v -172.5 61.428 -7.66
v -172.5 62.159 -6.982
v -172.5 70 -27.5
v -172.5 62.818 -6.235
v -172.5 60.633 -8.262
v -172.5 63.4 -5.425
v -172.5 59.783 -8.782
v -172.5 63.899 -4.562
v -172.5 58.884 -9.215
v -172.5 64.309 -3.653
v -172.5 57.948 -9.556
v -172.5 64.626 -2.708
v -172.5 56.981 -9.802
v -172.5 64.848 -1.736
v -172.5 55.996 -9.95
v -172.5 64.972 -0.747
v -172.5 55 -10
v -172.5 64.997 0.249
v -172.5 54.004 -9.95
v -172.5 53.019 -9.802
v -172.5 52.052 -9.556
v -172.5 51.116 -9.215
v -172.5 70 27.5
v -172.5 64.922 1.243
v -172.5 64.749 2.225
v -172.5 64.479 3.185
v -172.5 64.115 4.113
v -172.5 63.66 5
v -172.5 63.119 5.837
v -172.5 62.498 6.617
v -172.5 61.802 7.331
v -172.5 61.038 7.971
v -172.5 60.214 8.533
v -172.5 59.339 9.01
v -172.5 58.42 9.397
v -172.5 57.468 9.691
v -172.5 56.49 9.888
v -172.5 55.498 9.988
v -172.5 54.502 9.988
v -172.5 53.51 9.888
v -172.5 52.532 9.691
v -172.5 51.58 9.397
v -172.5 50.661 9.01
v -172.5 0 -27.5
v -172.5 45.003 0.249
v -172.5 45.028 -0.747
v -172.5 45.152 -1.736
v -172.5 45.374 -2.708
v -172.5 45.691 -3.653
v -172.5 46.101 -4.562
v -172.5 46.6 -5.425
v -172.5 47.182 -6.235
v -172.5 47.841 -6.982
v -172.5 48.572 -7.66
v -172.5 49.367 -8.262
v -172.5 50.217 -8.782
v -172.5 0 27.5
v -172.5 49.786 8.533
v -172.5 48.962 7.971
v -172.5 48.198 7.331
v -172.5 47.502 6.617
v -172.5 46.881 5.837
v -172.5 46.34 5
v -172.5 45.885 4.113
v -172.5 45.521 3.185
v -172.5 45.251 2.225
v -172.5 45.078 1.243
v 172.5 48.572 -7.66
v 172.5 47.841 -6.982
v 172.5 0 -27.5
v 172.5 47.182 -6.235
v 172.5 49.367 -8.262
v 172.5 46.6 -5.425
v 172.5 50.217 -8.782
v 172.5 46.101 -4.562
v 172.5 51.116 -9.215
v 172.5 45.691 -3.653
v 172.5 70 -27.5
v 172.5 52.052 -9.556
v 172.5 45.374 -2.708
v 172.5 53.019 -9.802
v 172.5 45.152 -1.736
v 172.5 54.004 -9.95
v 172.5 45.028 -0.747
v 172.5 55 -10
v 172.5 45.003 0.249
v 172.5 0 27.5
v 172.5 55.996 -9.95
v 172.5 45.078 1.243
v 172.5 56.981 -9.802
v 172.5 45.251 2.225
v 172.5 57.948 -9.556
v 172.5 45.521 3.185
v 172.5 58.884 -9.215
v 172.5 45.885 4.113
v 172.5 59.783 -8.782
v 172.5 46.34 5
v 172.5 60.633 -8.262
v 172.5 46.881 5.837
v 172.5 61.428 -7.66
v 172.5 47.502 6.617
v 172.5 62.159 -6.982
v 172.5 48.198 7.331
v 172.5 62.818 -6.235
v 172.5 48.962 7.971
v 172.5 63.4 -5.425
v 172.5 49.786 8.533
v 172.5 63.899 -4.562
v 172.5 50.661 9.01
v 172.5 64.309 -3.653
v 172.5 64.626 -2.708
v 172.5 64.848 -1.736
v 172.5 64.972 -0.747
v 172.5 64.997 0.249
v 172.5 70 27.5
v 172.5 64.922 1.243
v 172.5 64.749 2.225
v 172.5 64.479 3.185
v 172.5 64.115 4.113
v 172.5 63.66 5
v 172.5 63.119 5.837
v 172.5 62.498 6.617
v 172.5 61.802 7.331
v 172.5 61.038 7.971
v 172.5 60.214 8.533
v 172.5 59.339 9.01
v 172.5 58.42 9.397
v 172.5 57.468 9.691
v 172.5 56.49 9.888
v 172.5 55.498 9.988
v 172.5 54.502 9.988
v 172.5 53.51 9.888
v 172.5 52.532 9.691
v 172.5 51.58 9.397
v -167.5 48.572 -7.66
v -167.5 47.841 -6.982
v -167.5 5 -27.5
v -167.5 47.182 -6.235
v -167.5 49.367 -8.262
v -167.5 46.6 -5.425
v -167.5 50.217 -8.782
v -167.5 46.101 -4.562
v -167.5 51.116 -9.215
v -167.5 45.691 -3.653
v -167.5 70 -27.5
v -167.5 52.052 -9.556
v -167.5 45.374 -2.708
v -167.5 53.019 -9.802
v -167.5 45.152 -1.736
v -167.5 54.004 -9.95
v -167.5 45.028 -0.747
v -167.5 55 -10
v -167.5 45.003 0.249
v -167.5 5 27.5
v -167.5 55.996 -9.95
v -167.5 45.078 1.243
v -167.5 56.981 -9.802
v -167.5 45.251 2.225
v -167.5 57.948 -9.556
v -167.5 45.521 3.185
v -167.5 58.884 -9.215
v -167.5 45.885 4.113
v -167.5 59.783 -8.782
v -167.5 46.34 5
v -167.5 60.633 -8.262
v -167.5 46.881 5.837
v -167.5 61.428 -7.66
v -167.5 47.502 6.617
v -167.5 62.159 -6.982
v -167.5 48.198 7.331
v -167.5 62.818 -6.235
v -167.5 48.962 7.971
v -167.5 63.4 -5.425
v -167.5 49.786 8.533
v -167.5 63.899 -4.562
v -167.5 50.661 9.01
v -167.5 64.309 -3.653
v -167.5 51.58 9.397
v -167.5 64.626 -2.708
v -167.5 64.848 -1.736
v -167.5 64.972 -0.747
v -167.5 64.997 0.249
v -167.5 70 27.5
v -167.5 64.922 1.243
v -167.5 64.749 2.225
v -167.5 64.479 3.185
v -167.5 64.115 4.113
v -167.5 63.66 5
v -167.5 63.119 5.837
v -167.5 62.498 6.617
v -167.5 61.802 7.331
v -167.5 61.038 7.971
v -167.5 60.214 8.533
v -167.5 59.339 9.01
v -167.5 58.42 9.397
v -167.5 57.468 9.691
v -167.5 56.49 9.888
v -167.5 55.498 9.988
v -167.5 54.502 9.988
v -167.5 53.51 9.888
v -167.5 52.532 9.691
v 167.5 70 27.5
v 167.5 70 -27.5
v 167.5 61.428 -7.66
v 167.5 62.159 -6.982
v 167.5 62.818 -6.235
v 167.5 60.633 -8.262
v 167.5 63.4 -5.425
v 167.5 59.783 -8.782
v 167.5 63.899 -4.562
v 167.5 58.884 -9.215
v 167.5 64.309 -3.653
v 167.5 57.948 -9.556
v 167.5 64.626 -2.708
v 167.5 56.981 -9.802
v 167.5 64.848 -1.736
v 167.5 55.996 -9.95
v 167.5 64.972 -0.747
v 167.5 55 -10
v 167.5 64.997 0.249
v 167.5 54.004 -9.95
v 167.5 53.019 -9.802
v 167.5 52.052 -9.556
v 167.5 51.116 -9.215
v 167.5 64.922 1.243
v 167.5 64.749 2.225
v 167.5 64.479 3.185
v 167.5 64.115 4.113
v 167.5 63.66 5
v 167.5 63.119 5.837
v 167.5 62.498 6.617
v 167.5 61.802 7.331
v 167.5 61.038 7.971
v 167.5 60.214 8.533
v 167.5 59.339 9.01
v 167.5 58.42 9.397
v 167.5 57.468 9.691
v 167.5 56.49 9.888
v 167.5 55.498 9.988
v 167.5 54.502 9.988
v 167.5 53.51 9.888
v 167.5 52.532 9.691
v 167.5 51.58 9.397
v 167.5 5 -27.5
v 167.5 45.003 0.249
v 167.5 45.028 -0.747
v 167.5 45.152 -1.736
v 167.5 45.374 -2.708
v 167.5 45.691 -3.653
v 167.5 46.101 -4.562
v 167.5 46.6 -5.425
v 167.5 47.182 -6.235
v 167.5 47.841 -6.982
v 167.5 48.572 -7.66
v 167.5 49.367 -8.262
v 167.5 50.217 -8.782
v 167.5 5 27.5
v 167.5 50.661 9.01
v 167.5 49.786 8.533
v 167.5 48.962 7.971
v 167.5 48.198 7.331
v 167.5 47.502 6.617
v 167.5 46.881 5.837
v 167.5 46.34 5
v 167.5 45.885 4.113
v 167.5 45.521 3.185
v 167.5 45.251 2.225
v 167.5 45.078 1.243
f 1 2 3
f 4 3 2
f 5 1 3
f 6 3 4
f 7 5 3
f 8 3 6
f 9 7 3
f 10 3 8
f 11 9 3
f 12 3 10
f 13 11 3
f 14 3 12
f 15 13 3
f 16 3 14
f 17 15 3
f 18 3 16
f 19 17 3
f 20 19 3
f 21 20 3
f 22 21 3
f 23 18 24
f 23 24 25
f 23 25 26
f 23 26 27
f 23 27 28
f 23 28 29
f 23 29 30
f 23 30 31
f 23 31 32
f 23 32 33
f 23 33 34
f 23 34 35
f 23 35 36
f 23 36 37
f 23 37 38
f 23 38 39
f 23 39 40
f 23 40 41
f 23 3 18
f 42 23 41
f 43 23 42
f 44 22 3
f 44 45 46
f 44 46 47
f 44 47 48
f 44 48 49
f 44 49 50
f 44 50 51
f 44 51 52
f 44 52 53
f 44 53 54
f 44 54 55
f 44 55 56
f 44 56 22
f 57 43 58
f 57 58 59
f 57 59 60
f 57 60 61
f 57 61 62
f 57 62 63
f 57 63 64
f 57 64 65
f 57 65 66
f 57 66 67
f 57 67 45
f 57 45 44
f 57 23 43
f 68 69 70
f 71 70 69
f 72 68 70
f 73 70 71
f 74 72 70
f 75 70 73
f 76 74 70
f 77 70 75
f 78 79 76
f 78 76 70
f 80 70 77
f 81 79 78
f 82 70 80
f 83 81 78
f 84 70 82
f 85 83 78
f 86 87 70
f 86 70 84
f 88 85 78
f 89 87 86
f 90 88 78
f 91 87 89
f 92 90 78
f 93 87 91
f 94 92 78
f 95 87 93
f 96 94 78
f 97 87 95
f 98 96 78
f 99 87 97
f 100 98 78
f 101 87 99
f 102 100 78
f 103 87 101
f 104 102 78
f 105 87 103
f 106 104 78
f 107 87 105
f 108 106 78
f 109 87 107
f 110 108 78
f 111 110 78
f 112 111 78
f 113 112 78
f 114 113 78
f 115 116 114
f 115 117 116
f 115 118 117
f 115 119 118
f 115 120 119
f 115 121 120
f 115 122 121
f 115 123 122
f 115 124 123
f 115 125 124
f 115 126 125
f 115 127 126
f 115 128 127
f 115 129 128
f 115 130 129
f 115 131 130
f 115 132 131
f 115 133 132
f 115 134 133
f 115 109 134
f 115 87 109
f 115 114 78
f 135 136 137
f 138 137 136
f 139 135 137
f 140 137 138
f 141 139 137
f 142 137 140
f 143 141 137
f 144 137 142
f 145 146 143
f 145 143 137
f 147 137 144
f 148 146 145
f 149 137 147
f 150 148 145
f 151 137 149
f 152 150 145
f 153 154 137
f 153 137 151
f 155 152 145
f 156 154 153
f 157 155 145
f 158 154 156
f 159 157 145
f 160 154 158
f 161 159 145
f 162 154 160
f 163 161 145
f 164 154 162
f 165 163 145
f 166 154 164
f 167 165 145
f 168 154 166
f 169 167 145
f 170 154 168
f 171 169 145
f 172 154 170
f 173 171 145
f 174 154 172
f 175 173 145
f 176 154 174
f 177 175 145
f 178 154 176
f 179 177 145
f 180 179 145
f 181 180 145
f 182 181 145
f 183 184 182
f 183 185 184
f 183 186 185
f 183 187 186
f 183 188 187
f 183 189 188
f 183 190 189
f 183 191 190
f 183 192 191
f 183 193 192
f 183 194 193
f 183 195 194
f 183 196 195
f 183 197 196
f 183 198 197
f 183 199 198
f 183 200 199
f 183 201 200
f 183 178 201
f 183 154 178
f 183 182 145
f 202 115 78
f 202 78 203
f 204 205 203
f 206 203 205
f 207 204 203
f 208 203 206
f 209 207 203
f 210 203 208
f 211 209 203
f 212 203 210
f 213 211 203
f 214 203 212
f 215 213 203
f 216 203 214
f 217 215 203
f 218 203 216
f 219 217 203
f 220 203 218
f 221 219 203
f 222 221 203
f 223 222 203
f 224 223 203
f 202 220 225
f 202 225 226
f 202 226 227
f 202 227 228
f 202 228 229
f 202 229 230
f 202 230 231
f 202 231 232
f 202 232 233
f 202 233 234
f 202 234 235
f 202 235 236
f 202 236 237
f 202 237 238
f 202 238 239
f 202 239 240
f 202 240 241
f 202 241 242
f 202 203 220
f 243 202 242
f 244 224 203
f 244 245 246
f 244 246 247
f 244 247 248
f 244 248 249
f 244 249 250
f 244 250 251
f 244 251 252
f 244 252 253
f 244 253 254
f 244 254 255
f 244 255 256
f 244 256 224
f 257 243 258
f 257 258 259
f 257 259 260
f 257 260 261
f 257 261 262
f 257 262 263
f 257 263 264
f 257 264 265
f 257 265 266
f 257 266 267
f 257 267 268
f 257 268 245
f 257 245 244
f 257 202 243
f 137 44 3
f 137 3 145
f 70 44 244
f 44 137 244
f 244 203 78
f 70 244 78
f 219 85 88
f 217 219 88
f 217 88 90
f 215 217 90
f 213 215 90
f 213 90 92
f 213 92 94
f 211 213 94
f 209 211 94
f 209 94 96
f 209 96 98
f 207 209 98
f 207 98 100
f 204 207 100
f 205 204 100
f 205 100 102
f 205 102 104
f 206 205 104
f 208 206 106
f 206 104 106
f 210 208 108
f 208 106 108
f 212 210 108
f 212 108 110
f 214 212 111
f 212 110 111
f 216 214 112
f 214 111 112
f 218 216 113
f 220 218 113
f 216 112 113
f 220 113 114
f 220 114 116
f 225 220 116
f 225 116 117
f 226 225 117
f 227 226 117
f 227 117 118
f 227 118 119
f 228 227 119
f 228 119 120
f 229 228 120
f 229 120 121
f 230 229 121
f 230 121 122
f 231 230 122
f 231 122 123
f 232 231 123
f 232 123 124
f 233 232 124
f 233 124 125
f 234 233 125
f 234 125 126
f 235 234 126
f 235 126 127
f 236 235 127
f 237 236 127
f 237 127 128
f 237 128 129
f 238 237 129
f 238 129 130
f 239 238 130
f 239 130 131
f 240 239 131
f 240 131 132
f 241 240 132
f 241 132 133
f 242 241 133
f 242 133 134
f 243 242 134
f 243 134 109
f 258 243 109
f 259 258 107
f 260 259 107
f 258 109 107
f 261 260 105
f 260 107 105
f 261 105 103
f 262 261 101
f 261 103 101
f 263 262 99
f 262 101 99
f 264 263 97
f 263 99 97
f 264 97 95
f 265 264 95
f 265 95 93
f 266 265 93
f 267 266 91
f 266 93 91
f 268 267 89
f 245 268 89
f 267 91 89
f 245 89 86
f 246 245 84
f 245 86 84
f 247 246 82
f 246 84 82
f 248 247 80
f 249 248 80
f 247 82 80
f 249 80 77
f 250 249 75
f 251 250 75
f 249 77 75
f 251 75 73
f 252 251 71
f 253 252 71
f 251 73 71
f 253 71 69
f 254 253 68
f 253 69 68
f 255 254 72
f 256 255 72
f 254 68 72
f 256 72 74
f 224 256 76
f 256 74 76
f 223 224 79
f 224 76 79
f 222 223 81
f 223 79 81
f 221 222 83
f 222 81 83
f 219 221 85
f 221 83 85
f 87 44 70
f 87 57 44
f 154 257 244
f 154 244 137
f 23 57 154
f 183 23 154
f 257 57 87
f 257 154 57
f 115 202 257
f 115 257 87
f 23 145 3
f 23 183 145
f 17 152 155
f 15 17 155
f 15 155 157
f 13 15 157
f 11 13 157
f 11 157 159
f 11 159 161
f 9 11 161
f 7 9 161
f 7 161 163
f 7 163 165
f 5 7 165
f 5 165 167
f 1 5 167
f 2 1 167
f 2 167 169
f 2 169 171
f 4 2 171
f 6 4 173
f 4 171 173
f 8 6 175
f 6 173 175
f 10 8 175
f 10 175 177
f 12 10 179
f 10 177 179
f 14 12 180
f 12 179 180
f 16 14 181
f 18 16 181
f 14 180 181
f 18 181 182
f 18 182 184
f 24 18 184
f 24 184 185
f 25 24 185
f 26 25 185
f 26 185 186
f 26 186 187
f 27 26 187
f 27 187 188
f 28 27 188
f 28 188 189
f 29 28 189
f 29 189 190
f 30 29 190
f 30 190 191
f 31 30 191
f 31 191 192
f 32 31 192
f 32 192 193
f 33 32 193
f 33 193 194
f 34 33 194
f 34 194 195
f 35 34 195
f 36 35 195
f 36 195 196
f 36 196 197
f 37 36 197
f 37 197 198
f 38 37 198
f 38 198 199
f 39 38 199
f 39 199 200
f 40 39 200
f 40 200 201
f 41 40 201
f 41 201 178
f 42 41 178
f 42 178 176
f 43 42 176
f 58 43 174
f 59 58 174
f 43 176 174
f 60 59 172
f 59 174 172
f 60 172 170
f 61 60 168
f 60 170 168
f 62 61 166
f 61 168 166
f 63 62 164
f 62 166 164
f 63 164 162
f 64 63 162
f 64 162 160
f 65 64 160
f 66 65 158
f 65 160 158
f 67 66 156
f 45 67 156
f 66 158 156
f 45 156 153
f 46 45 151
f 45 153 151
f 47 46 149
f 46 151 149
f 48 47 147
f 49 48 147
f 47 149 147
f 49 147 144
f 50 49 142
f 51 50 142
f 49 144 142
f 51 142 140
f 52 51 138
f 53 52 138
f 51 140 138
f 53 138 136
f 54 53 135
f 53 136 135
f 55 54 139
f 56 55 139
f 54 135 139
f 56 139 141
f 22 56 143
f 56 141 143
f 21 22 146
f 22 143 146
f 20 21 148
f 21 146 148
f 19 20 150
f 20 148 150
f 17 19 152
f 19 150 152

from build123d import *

# Parameters (mm, degrees)
BOSS_EXTRUDE1_DEPTH      = 27.5
BOSS_EXTRUDE1_DEPTH_BACK = 27.5
SKETCH2_R                = 10
CUT_EXTRUDE1_DEPTH       = 354.102322281


with BuildPart() as part:
    # Sketch1 → Boss-Extrude1 (new, two sides: drawn at the far end of the back side and taken through both)
    with BuildSketch(Plane.XY.offset(-BOSS_EXTRUDE1_DEPTH_BACK)):
        Polygon((-172.5, 0), (172.5, 0), (172.5, 70), (167.5, 70), (167.5, 5), (-167.5, 5), (-167.5, 70), (-172.5, 70), align=None)
    extrude(amount=BOSS_EXTRUDE1_DEPTH + BOSS_EXTRUDE1_DEPTH_BACK)

    # Sketch2 → Cut-Extrude1 (cut, through all)
    with BuildSketch(Plane(origin=(172.5, 0, 0), x_dir=(0, 0, -1), z_dir=(1, 0, 0))):
        with Locations((0, 55)):
            Circle(SKETCH2_R)
    extrude(amount=-CUT_EXTRUDE1_DEPTH, mode=Mode.SUBTRACT)


solid = part.part
